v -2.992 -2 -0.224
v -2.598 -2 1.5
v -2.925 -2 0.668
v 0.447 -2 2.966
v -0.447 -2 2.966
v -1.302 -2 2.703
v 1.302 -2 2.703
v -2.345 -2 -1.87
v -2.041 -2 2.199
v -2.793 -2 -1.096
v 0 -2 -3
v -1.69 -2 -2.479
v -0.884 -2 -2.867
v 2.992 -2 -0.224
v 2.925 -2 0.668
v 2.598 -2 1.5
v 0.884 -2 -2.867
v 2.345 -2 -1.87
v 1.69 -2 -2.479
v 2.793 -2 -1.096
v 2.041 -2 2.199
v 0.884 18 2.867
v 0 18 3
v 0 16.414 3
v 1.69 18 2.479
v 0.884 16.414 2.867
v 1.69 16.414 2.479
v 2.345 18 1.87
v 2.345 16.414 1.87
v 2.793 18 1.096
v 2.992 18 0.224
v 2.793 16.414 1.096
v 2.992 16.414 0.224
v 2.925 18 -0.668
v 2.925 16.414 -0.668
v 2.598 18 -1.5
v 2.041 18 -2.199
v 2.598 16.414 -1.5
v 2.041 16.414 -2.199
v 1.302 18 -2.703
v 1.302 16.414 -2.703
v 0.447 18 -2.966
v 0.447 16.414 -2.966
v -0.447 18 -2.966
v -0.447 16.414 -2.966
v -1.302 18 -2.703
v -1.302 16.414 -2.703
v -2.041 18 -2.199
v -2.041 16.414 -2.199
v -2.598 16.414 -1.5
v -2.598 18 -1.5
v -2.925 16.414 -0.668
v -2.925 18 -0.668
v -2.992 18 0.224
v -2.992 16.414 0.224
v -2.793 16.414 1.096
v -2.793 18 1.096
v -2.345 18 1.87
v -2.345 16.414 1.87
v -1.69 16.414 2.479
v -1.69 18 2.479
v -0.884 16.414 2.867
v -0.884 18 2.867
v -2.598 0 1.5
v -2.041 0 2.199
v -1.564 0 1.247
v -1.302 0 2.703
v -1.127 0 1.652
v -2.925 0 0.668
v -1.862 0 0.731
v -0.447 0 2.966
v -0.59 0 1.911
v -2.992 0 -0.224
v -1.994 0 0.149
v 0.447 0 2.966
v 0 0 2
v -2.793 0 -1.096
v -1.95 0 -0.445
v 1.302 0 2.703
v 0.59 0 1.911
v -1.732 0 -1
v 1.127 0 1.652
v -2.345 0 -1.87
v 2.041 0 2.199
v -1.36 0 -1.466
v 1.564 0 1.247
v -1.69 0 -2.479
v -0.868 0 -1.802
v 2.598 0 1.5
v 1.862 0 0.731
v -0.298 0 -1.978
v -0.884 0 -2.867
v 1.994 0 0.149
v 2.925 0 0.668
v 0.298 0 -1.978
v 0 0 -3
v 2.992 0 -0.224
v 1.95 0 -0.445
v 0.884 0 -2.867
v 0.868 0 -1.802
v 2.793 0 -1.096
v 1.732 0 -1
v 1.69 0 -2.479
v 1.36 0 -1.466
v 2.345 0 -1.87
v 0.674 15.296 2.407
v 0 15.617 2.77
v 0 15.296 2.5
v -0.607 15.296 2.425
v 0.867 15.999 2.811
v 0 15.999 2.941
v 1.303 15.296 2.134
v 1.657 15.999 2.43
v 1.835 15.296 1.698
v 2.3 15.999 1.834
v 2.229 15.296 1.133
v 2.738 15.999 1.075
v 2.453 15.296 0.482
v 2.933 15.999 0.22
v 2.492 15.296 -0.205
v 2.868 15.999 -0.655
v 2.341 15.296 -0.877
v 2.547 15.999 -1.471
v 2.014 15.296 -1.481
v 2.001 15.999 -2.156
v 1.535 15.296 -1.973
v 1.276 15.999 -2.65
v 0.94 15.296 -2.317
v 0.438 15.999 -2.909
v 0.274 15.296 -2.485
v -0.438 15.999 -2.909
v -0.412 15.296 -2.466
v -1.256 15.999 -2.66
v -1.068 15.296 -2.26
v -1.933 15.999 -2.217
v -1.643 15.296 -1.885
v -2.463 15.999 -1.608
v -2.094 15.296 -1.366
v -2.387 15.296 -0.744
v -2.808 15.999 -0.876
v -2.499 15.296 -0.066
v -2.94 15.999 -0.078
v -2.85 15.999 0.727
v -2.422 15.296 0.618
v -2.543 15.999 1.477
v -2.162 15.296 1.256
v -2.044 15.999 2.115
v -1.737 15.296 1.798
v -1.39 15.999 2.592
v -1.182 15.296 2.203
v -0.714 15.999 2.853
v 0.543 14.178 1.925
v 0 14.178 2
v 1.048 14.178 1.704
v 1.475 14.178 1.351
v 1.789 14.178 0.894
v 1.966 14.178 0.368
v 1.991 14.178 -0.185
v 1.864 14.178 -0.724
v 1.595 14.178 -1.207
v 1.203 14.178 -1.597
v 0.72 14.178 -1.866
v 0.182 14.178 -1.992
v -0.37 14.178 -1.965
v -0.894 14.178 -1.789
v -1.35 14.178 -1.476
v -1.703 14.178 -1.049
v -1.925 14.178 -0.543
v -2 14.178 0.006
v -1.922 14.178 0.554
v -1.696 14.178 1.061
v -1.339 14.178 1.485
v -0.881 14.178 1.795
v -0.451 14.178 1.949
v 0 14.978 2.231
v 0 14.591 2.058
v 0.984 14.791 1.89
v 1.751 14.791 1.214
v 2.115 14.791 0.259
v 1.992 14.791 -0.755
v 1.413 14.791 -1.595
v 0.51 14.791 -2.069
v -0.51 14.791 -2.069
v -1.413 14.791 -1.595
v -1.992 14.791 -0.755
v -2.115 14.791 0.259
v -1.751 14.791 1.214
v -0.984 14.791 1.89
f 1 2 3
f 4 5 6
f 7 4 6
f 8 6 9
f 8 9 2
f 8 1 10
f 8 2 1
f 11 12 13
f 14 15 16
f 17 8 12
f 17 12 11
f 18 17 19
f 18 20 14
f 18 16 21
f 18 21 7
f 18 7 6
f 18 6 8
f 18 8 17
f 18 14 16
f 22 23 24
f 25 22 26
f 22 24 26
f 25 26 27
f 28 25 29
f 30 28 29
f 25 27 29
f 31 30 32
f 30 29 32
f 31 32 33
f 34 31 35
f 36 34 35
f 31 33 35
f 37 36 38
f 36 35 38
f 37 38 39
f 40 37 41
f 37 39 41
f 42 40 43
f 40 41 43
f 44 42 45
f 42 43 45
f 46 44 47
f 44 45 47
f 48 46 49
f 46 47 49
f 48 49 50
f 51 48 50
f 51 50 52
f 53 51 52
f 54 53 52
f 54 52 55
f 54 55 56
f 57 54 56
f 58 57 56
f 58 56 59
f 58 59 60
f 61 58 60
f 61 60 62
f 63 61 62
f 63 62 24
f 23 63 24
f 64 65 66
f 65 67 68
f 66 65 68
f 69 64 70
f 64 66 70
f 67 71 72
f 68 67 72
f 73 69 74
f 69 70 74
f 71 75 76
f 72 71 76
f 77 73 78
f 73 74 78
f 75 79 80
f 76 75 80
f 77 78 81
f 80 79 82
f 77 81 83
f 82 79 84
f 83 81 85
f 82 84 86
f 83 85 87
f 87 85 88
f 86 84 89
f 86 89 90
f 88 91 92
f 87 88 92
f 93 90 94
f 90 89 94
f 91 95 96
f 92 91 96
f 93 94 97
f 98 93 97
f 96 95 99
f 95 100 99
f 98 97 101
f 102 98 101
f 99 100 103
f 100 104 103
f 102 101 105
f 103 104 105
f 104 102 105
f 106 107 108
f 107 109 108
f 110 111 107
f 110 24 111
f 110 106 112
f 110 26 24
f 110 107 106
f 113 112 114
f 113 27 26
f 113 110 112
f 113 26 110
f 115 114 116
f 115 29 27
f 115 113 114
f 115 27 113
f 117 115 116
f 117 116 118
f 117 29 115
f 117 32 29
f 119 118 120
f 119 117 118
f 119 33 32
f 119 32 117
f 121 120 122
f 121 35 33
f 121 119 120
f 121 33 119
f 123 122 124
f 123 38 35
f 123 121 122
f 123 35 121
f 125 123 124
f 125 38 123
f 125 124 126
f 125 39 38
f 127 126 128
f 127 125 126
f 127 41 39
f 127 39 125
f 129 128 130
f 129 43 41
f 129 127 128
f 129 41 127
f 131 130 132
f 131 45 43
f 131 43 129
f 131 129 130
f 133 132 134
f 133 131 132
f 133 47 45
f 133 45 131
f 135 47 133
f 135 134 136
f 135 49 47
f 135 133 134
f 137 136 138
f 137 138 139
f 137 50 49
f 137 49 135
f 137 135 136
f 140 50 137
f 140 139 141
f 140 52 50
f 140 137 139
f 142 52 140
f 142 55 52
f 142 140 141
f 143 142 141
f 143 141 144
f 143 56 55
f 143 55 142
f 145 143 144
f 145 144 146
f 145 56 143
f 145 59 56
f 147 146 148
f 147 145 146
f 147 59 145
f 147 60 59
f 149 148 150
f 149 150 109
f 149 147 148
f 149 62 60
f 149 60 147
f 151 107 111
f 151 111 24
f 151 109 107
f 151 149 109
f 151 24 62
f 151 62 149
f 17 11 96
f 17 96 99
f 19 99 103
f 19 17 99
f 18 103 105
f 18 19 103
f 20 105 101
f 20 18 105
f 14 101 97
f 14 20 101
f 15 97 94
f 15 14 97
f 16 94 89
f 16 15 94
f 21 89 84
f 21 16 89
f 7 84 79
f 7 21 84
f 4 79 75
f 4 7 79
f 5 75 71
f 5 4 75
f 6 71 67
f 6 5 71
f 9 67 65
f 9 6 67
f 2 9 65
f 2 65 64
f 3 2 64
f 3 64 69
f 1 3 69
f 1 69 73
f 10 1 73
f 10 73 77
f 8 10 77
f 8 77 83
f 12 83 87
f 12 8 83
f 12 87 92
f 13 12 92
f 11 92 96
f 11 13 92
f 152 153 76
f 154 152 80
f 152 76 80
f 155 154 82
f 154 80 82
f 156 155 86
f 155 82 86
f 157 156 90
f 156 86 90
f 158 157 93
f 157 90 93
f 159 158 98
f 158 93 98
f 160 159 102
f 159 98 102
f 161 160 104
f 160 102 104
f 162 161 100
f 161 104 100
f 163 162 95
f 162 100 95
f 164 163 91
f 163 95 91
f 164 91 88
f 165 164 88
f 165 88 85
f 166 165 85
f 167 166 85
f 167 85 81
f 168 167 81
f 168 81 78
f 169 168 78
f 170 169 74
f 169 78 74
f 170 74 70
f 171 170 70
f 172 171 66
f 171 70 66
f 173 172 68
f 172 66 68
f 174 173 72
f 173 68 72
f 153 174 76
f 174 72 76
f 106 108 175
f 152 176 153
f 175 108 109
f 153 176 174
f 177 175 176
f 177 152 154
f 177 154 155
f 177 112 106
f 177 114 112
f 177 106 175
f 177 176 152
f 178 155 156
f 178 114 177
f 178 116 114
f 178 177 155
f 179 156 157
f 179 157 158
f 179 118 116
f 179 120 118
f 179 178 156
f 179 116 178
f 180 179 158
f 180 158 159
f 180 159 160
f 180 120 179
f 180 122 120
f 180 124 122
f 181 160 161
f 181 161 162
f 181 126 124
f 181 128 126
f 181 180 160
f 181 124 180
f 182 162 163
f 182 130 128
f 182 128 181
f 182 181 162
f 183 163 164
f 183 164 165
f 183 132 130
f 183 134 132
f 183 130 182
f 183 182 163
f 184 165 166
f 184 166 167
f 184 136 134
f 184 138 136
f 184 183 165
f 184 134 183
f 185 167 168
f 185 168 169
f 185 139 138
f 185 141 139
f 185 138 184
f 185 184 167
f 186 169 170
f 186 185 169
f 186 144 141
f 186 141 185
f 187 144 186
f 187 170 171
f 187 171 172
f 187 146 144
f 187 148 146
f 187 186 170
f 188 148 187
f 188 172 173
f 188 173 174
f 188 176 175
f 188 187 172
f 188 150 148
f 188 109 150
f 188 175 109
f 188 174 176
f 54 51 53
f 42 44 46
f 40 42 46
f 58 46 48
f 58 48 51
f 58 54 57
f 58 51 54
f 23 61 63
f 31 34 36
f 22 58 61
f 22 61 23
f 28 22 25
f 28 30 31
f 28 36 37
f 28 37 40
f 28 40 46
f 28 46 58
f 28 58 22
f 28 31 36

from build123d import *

# Parameters (mm, degrees)
SKETCH1_R           = 2
ROD_EXTRUSION_DEPTH = 15
SKETCH2_R           = 3
BOSS_EXTRUDE2_DEPTH = 3
FILLET3_R           = 1.5
FILLET4_R           = 1.5
INNER_START         = 2
SKETCH3_R           = 3
INNER_TIP_DEPTH     = 2


with BuildPart() as part:
    # Sketch1 → rod extrusion (new body)
    with BuildSketch(Plane(origin=(0, 0, 0), x_dir=(1, 0, 0), z_dir=(0, 1, 0))):
        with Locations(Location((0, 0, 0), (0, 0, 270))):
            Circle(SKETCH1_R)
    extrude(amount=ROD_EXTRUSION_DEPTH)

    # Sketch2 → Boss-Extrude2 (add)
    with BuildSketch(Plane(origin=(0, 15, 0), x_dir=(1, 0, 0), z_dir=(0, 1, 0))):
        with Locations(Location((0, 0, 0), (0, 0, 270))):
            Circle(SKETCH2_R)
    extrude(amount=BOSS_EXTRUDE2_DEPTH)

    # Fillet3
    # the kernel refuses this fillet: 1.5 mm, written as the material it takes off along each edge
    with BuildSketch(Plane(origin=(0, 15, 0), x_dir=(0, 0, 1), z_dir=(-1, 0, 0))) as fillet3_piece_1:
        with BuildLine():
            CenterArc((1.5, 1.414213562), FILLET3_R, 289.471220634, 70.528779366)
            Line((2, 0), (2.01, -0.028284271))
            ThreePointArc((2.01, -0.028284271), (2.5, -0.03), (3, -0.03))
            Line((3, -0.03), (3.03, 0))
            Line((3.03, 0), (3.03, 1.414213562))
            Line((3.03, 1.414213562), (3, 1.414213562))
        make_face()
    revolve(axis=Axis((0, 15, 0), (0, 1, 0)), mode=Mode.SUBTRACT)

    # Fillet4
    fillet4_edges = [part.edges().sort_by_distance(p)[0] for p in [
        (0, 15, -2),
    ]]
    fillet(fillet4_edges, radius=FILLET4_R)

    # Sketch3 → inner tip (add)
    with BuildSketch(Plane.XZ.offset(INNER_START)):
        with Locations(Location((0, 0, 0), (0, 0, 270))):
            Circle(SKETCH3_R)
    extrude(amount=-INNER_TIP_DEPTH)


solid = part.part
